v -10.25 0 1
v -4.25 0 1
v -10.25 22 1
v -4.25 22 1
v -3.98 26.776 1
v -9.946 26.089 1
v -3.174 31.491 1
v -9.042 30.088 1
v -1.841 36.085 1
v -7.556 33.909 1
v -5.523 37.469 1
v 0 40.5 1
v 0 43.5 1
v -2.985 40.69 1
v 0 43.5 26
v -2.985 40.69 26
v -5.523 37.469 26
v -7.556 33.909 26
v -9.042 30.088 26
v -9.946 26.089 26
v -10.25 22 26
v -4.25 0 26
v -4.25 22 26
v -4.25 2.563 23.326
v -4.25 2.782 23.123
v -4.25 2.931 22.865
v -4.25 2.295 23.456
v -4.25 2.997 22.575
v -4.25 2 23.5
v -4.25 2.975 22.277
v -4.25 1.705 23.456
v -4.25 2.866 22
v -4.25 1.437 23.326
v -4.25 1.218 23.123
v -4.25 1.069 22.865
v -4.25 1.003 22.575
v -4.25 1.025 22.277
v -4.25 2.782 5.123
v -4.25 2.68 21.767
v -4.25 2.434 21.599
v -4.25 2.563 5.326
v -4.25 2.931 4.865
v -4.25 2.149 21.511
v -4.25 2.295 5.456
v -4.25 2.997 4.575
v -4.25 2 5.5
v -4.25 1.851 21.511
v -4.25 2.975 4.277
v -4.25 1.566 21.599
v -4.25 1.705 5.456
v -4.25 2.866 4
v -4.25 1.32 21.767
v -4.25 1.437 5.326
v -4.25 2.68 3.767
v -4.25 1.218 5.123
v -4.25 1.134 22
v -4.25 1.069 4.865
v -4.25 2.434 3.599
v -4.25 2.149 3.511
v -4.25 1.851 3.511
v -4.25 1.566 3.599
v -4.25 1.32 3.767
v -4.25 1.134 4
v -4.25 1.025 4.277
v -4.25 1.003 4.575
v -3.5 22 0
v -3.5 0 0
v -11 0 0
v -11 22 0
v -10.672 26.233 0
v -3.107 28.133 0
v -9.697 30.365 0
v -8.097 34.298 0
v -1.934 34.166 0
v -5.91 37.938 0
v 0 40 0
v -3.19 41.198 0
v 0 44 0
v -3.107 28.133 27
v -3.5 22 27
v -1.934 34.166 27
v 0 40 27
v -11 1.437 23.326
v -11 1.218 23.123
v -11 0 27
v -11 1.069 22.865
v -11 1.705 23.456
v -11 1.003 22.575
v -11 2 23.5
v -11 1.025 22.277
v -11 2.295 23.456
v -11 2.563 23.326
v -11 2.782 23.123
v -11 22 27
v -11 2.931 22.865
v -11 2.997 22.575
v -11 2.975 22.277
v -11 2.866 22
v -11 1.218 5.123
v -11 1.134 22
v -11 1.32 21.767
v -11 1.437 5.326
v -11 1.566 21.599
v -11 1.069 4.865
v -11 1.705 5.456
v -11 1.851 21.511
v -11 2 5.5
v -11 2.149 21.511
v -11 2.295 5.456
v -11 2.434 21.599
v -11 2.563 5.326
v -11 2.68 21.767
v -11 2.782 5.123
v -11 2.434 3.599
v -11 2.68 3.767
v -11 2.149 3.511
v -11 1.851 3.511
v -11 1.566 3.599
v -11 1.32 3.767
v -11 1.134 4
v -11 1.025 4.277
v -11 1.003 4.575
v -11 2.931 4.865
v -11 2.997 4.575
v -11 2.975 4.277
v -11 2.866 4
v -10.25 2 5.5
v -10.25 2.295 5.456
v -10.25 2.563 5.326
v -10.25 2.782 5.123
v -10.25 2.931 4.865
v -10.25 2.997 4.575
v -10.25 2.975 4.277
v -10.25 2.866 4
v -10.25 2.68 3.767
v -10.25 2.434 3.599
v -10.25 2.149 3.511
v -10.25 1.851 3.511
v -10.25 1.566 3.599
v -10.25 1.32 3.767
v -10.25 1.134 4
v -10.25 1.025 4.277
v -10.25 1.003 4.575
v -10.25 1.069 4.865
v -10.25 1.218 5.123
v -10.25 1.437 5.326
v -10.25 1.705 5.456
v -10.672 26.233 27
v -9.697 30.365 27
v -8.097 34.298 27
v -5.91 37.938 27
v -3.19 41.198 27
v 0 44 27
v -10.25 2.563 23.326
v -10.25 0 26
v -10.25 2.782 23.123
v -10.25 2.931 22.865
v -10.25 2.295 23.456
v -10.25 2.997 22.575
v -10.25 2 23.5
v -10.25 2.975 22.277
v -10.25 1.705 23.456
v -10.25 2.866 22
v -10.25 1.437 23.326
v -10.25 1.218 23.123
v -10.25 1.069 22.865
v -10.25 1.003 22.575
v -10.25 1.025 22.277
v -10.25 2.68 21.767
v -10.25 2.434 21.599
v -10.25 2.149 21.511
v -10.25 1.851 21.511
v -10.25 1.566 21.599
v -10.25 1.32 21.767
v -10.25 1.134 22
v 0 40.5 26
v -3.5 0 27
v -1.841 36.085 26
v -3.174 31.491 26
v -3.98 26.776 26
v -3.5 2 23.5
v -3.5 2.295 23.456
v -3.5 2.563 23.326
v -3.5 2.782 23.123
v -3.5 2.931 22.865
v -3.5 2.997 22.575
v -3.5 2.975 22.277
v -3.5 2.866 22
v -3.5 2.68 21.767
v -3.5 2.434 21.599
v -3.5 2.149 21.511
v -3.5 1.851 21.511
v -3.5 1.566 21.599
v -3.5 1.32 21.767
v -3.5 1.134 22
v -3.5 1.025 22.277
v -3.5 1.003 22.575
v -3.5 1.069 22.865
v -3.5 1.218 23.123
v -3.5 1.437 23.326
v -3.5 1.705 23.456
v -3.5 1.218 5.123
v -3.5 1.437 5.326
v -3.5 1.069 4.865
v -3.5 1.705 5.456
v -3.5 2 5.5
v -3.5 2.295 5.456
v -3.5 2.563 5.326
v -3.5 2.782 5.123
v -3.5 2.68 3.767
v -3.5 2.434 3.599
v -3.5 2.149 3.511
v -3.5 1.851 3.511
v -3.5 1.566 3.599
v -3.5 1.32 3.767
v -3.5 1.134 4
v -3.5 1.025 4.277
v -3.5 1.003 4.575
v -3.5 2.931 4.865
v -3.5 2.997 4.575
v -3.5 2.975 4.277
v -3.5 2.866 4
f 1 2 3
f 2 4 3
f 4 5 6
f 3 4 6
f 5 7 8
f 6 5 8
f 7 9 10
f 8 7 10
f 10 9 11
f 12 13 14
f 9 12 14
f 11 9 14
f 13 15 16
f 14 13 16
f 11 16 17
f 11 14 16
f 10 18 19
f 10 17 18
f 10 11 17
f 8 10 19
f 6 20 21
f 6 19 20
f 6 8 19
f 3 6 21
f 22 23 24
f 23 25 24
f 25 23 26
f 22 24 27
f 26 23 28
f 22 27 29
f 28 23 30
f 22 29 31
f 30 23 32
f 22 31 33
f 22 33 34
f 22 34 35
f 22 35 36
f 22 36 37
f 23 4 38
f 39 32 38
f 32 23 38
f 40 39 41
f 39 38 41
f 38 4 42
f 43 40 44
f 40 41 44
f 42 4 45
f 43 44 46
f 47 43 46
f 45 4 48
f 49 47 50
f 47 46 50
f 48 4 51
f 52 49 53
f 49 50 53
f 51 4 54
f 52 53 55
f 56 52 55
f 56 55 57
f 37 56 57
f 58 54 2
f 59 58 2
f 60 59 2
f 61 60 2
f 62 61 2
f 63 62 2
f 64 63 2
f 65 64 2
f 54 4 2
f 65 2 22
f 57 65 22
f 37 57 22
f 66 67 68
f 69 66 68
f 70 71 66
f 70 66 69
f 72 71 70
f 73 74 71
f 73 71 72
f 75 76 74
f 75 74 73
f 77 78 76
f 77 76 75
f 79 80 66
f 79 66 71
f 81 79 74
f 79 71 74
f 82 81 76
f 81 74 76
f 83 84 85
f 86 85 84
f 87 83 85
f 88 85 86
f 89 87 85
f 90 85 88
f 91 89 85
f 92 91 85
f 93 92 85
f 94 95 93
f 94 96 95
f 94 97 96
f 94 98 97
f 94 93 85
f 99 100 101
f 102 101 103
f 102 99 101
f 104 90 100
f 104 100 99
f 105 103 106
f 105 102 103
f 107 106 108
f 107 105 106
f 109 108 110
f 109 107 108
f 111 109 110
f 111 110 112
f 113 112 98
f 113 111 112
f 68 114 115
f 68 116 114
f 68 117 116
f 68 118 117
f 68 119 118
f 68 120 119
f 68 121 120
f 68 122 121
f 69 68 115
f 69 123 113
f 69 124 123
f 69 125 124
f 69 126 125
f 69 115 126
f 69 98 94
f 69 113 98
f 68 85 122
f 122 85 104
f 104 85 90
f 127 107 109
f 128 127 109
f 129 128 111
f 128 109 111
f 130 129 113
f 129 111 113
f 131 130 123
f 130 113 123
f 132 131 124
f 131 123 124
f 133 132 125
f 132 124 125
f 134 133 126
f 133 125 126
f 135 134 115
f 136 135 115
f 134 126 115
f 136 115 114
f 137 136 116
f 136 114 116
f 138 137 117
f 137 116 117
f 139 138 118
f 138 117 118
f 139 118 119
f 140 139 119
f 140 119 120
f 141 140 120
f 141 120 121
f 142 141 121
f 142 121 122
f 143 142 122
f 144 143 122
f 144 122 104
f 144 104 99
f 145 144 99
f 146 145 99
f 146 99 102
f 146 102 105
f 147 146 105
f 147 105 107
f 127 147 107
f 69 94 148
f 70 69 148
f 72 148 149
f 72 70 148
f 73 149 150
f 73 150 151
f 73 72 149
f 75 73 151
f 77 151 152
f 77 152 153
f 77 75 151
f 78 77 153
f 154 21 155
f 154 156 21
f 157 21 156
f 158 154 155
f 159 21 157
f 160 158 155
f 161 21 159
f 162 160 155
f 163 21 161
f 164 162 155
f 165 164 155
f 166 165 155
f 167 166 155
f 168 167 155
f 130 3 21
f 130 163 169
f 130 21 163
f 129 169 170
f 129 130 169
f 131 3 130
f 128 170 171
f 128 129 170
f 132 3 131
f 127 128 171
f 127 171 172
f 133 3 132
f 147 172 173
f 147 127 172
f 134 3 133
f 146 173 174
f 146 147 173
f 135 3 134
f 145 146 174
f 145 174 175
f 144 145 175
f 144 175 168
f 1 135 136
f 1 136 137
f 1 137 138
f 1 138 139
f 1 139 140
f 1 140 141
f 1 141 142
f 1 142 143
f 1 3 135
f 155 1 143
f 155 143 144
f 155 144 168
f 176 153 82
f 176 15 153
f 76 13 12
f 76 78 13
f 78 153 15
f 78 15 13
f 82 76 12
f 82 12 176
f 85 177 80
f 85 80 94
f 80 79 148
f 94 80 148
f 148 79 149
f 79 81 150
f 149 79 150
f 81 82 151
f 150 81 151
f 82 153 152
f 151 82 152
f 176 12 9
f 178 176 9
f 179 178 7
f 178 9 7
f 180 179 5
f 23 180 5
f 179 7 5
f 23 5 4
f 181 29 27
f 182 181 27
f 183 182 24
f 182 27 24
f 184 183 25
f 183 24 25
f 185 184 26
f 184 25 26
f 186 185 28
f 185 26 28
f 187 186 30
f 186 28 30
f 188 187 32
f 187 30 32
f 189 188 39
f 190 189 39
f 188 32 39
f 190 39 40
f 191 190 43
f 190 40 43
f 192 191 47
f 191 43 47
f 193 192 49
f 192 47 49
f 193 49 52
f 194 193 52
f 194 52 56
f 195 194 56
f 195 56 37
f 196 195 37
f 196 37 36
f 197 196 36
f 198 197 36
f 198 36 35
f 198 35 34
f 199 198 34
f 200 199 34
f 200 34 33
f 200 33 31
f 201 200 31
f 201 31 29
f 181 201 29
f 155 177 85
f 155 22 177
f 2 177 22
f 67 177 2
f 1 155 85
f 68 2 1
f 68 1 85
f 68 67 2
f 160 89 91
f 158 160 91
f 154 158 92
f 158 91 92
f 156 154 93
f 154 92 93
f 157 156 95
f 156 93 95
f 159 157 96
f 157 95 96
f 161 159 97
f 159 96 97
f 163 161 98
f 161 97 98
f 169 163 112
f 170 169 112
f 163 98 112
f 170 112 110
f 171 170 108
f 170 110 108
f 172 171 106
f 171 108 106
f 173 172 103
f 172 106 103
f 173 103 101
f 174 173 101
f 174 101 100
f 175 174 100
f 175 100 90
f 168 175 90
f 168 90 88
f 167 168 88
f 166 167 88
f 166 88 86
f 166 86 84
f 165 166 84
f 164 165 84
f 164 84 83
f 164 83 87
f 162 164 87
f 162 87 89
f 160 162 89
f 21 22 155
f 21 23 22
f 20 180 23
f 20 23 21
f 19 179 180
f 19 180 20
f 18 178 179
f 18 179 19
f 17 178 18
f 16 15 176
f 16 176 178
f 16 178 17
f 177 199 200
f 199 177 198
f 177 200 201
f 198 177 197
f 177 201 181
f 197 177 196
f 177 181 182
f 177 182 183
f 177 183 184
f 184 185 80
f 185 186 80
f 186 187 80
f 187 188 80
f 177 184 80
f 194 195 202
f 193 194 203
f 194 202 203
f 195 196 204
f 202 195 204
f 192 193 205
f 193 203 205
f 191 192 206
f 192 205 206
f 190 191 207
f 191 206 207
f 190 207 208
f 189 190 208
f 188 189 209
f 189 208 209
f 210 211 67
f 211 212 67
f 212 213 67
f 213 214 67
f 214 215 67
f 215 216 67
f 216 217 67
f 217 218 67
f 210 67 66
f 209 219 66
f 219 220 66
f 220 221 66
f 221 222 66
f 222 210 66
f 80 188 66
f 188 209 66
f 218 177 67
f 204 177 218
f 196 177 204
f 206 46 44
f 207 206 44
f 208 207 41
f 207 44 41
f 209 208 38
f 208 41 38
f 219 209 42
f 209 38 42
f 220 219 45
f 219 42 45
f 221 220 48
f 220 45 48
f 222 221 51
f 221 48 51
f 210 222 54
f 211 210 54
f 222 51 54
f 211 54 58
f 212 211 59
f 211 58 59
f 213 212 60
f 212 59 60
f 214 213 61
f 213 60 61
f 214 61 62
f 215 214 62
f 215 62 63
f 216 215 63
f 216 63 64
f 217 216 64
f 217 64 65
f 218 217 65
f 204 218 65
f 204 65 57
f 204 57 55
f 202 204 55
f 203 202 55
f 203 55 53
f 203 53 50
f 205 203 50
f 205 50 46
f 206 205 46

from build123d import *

# Parameters (mm, degrees)
BOSS_EXTRUDE1_DEPTH   = 27
BOSS_EXTRUDE1_2_DEPTH = 27
BOSS_EXTRUDE2_START   = -1
BOSS_EXTRUDE2_DEPTH   = 1
BOSS_EXTRUDE3_DEPTH   = 1
SKETCH4_R             = 1
CUT_EXTRUDE1_DEPTH    = 15


with BuildPart() as part:
    # Sketch1 → Boss-Extrude1 (new body)
    with BuildSketch(Plane.XY):
        with BuildLine():
            Line((-11, 0), (-11, 22))
            ThreePointArc((-11, 22), (-8.096747752, 34.298373876), (0, 44))
            Line((0, 44), (0, 43.5))
            ThreePointArc((0, 43.5), (-7.556411695, 33.909161389), (-10.25, 22))
            Line((-10.25, 22), (-10.25, 0))
            Line((-10.25, 0), (-11, 0))
        make_face()
    extrude(amount=BOSS_EXTRUDE1_DEPTH)



with BuildPart() as body_2:
    # Sketch1 → Boss-Extrude1 2 (new body)
    with BuildSketch(Plane.XY):
        with BuildLine():
            Line((-3.5, 0), (-3.5, 22))
            ThreePointArc((-3.5, 22), (-2.616882111, 31.16856041), (0, 40))
            Line((0, 40), (0, 40.5))
            ThreePointArc((0, 40.5), (-3.173839594, 31.490949636), (-4.25, 22))
            Line((-4.25, 22), (-4.25, 0))
            Line((-4.25, 0), (-3.5, 0))
        make_face()
    extrude(amount=BOSS_EXTRUDE1_2_DEPTH)


with BuildPart() as part_1:
    add(part.part)

    add(body_2.part)  # Boss-Extrude2 merges body 2
    # Sketch2 → Boss-Extrude2 (add)
    with BuildSketch(Plane.XY.offset(27).offset(BOSS_EXTRUDE2_START)):
        with BuildLine():
            Line((-4.25, 0), (-10.25, 0))
            Line((-10.25, 0), (-10.25, 22))
            ThreePointArc((-10.25, 22), (-7.556411695, 33.909161389), (0, 43.5))
            Line((0, 43.5), (0, 40.5))
            ThreePointArc((0, 40.5), (-3.173839594, 31.490949636), (-4.25, 22))
            Line((-4.25, 22), (-4.25, 0))
        make_face()
    extrude(amount=BOSS_EXTRUDE2_DEPTH)

    # Sketch3 → Boss-Extrude3 (add)
    with BuildSketch(Plane(origin=(0, 0, 0), x_dir=(-1, 0, 0), z_dir=(0, 0, -1))):
        with BuildLine():
            Line((4.25, 0), (10.25, 0))
            Line((10.25, 0), (10.25, 22))
            ThreePointArc((10.25, 22), (7.556411695, 33.909161389), (0, 43.5))
            Line((0, 43.5), (0, 40.5))
            ThreePointArc((0, 40.5), (3.173839594, 31.490949636), (4.25, 22))
            Line((4.25, 22), (4.25, 0))
        make_face()
    extrude(amount=-BOSS_EXTRUDE3_DEPTH)

    # Sketch4 → Cut-Extrude1 (cut)
    with BuildSketch(Plane.ZY.offset(11)):
        with Locations((4.5, 2)):
            Circle(SKETCH4_R)
        with Locations((22.5, 2)):
            Circle(SKETCH4_R)
    extrude(amount=-CUT_EXTRUDE1_DEPTH, mode=Mode.SUBTRACT)


solid = part_1.part
